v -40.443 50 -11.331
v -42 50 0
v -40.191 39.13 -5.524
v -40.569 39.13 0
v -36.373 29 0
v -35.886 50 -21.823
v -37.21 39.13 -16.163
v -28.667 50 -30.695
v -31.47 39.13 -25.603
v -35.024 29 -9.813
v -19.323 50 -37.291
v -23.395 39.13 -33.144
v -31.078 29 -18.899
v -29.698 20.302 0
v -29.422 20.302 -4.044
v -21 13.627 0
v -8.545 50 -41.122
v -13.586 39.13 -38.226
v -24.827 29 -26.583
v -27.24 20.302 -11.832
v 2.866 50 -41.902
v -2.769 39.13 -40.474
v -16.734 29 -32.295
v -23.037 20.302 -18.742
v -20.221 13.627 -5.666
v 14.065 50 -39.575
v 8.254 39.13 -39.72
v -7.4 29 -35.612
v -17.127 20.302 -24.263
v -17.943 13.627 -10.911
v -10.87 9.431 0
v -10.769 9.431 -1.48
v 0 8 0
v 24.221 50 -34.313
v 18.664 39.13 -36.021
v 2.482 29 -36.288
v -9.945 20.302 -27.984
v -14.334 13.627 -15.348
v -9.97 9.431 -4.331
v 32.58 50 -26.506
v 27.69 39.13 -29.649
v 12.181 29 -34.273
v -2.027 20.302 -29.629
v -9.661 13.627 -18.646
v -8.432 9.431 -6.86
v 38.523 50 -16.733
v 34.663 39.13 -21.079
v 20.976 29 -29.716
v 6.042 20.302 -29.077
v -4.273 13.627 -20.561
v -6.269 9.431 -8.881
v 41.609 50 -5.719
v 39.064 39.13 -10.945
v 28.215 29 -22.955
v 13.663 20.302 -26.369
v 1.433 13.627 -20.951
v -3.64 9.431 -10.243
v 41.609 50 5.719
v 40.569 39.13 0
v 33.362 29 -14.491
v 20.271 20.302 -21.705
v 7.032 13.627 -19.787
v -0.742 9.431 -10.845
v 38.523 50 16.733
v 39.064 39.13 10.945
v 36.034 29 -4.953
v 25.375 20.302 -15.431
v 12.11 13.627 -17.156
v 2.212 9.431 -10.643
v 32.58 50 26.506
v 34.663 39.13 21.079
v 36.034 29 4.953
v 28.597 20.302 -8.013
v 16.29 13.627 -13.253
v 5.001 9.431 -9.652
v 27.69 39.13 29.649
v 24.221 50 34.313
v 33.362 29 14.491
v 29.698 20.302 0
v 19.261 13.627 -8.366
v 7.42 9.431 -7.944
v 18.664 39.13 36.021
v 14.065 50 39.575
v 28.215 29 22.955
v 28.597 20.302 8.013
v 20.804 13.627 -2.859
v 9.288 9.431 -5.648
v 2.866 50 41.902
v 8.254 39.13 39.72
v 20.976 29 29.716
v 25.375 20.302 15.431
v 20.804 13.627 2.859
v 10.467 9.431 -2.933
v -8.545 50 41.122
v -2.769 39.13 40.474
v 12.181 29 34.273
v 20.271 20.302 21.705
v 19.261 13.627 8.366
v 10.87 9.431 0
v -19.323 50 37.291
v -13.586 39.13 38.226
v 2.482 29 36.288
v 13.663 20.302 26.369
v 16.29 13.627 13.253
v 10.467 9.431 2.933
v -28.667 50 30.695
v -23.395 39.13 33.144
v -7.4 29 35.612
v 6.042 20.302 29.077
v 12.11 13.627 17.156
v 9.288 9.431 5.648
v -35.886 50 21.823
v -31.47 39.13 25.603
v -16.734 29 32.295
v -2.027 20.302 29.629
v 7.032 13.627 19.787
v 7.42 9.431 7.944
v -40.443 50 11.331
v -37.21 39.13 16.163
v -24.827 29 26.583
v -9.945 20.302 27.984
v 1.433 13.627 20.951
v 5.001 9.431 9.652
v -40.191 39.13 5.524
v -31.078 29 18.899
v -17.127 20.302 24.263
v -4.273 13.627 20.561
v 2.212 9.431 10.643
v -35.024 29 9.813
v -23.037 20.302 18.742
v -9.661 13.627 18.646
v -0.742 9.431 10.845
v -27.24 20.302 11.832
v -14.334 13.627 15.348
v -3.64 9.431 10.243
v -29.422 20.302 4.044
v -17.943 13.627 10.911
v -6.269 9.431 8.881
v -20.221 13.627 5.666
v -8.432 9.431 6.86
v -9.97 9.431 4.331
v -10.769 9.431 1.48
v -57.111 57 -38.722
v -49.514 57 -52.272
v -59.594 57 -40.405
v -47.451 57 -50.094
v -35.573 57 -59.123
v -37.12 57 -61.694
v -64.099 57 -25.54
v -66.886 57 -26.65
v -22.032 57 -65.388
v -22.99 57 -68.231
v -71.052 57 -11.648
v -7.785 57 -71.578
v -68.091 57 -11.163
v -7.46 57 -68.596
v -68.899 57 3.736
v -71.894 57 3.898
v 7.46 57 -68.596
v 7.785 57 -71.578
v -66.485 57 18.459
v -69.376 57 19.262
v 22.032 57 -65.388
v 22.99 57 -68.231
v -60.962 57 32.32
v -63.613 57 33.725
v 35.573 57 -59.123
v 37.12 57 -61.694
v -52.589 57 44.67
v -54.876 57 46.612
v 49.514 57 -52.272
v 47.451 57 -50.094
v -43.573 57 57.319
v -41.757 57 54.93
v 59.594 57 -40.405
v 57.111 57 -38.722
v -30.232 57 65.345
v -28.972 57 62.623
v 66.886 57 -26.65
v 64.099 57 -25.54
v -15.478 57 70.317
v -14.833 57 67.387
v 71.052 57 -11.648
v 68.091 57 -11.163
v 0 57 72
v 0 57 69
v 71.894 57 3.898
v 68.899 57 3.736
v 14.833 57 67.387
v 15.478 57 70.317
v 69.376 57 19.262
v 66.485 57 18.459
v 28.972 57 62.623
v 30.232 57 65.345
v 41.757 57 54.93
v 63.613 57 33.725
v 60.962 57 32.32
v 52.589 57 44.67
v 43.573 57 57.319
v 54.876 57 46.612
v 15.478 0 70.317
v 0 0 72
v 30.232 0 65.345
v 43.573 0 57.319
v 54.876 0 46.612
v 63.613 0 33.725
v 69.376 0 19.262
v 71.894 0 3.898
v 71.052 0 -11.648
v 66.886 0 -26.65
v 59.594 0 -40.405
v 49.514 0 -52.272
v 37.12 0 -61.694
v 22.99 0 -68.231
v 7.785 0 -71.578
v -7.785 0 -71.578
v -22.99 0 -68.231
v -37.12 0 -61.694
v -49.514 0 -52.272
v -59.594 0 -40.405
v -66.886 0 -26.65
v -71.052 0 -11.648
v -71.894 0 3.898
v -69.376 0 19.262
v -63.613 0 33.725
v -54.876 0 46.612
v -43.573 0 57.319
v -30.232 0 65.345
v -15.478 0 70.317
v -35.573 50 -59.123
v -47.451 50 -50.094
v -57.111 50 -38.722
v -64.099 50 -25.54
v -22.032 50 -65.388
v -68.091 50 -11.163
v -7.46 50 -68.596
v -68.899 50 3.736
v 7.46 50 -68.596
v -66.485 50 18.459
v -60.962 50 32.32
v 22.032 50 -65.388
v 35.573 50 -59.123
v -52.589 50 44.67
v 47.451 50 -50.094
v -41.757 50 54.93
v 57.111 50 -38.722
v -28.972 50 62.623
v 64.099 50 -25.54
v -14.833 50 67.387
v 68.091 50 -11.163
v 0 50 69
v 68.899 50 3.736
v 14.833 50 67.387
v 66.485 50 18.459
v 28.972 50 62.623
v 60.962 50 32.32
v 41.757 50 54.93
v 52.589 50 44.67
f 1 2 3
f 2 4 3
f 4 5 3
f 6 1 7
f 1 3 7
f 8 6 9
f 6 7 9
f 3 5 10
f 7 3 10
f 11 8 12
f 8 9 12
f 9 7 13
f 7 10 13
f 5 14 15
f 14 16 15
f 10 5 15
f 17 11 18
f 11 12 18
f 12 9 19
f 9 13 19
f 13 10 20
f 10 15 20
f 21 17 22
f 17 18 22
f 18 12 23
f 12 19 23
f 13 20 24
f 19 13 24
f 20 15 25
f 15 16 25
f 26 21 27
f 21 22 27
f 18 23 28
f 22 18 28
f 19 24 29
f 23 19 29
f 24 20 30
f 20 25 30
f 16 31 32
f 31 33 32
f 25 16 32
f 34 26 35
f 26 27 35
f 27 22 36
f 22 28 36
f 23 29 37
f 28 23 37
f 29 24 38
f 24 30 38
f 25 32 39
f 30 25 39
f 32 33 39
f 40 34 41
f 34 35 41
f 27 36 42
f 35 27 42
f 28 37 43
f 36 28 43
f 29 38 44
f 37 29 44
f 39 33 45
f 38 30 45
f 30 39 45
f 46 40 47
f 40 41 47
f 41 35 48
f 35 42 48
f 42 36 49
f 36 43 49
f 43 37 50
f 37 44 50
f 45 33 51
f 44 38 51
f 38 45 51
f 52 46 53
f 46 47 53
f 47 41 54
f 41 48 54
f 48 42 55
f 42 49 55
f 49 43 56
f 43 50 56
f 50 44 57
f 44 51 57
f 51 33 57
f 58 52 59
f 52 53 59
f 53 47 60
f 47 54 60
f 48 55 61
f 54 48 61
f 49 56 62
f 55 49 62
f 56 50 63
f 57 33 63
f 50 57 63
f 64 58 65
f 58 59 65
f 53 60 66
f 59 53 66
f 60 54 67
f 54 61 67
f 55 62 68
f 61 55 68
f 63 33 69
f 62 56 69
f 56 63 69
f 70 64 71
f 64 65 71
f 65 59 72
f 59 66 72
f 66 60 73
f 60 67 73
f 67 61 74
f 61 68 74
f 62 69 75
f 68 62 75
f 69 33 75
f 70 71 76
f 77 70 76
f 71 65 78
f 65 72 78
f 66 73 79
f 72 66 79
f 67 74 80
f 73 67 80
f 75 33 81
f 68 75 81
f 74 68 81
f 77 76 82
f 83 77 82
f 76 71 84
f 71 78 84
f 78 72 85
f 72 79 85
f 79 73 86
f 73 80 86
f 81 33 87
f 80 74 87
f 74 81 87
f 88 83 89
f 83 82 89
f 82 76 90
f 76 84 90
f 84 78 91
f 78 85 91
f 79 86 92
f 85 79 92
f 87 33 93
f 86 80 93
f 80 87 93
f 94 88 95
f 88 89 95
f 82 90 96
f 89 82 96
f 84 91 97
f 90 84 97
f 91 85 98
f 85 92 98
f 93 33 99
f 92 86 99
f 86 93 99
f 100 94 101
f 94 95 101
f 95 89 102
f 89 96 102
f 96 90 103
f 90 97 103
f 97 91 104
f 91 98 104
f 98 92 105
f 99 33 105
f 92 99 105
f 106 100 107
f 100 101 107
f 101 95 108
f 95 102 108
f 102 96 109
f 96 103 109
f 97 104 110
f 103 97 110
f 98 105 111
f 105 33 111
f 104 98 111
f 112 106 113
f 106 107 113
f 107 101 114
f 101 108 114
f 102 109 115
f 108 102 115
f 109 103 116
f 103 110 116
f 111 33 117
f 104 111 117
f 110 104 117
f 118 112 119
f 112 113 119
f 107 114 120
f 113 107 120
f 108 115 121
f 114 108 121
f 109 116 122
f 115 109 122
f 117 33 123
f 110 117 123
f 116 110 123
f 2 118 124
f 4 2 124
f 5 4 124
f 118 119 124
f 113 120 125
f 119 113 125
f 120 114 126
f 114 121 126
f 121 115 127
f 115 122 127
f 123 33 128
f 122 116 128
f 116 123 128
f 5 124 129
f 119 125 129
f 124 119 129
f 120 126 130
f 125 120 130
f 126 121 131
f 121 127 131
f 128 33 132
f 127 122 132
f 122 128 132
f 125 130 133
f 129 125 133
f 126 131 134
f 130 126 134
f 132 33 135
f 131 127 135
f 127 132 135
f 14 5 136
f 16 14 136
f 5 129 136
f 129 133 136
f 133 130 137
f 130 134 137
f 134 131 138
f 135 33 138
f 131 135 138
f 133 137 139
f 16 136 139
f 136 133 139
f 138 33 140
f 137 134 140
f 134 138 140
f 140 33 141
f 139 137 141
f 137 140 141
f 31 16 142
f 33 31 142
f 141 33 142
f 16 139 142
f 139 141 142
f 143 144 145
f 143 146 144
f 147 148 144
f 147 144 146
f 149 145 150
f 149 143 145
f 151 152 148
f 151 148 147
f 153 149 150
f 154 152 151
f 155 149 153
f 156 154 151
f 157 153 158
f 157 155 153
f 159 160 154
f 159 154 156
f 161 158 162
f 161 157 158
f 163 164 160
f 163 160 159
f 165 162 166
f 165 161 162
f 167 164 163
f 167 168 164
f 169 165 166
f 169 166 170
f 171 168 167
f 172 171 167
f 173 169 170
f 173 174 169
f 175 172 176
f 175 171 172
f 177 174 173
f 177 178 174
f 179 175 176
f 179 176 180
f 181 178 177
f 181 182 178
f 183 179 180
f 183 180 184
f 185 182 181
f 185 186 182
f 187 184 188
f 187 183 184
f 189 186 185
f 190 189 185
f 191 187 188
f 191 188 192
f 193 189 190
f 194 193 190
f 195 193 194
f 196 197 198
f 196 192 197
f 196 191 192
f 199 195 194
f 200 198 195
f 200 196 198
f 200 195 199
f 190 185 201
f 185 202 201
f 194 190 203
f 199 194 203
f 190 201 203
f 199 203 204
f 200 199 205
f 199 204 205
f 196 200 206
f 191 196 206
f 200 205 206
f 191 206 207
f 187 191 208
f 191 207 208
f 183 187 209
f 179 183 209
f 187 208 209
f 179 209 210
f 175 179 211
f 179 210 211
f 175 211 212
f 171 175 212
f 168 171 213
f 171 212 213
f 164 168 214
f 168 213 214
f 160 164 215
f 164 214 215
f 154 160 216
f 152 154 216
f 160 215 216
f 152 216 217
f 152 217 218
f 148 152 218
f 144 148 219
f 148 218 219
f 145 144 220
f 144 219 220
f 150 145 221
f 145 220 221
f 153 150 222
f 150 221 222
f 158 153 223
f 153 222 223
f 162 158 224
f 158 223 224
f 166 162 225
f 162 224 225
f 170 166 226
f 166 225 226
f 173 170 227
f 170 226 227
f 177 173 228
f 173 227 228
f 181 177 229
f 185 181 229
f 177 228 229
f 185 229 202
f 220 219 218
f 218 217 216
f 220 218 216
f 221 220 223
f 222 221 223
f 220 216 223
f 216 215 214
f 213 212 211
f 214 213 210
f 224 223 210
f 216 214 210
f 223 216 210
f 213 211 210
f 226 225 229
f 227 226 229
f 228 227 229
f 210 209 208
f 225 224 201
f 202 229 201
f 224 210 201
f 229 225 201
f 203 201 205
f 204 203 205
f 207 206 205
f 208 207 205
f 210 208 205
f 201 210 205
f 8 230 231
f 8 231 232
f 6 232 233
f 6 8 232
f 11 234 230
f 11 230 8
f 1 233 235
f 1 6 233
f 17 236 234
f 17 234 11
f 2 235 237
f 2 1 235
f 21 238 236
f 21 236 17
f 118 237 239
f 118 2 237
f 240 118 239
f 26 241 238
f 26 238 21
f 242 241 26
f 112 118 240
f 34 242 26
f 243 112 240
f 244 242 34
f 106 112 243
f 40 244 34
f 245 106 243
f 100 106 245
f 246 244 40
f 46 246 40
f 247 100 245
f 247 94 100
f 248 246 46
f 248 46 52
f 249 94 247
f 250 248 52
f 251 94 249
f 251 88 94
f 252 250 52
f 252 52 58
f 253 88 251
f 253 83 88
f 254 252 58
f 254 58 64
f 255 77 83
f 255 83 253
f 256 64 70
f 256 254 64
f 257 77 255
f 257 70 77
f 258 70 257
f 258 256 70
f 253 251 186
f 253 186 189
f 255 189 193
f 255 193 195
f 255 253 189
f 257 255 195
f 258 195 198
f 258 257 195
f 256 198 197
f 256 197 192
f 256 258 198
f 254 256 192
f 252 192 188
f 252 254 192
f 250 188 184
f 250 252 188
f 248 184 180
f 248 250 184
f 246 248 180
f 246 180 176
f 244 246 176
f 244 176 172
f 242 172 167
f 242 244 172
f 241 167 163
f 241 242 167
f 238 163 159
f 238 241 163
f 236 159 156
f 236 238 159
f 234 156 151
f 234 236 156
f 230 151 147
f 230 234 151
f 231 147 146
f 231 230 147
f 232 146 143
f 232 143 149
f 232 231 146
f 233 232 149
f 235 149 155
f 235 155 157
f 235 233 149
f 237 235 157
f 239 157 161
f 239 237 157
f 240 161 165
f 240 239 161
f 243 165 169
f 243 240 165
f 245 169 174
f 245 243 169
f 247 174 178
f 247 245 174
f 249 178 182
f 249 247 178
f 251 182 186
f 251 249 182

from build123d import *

# Parameters (mm, degrees)
SKETCH1_R           = 72
BOSS_EXTRUDE4_DEPTH = 50
SKETCH5_R           = 72
SKETCH5_R_2         = 69
BOSS_EXTRUDE5_DEPTH = 7


with BuildPart() as part:
    # Sketch1 → Boss-Extrude4 (new body)
    with BuildSketch(Plane(origin=(0, 0, 0), x_dir=(1, 0, 0), z_dir=(0, 1, 0))):
        with Locations(Location((0, 0, 0), (0, 0, 270))):
            Circle(SKETCH1_R)
    extrude(amount=BOSS_EXTRUDE4_DEPTH)

    # Sketch4 → Cut-Revolve2 (revolve, cut)
    with BuildSketch(Plane.XY, mode=Mode.PRIVATE) as cut_revolve2_sk:
        with BuildLine():
            Line((0, 50), (42, 50))
            ThreePointArc((42, 50), (29.69848481, 20.30151519), (0, 8))
            Line((0, 8), (0, 50))
        make_face()
    revolve(cut_revolve2_sk.sketch.rotate(Axis((0, 50, 0), (0, -1, 0)), 180), axis=Axis((0, 50, 0), (0, -1, 0)), mode=Mode.SUBTRACT)

    # Sketch5 → Boss-Extrude5 (add)
    with BuildSketch(Plane(origin=(0, 50, 0), x_dir=(1, 0, 0), z_dir=(0, 1, 0))):
        with Locations(Location((0, 0, 0), (0, 0, 270))):
            Circle(SKETCH5_R)
        with Locations(Location((0, 0, 0), (0, 0, 270))):
            Circle(SKETCH5_R_2, mode=Mode.SUBTRACT)
    extrude(amount=BOSS_EXTRUDE5_DEPTH)


solid = part.part
